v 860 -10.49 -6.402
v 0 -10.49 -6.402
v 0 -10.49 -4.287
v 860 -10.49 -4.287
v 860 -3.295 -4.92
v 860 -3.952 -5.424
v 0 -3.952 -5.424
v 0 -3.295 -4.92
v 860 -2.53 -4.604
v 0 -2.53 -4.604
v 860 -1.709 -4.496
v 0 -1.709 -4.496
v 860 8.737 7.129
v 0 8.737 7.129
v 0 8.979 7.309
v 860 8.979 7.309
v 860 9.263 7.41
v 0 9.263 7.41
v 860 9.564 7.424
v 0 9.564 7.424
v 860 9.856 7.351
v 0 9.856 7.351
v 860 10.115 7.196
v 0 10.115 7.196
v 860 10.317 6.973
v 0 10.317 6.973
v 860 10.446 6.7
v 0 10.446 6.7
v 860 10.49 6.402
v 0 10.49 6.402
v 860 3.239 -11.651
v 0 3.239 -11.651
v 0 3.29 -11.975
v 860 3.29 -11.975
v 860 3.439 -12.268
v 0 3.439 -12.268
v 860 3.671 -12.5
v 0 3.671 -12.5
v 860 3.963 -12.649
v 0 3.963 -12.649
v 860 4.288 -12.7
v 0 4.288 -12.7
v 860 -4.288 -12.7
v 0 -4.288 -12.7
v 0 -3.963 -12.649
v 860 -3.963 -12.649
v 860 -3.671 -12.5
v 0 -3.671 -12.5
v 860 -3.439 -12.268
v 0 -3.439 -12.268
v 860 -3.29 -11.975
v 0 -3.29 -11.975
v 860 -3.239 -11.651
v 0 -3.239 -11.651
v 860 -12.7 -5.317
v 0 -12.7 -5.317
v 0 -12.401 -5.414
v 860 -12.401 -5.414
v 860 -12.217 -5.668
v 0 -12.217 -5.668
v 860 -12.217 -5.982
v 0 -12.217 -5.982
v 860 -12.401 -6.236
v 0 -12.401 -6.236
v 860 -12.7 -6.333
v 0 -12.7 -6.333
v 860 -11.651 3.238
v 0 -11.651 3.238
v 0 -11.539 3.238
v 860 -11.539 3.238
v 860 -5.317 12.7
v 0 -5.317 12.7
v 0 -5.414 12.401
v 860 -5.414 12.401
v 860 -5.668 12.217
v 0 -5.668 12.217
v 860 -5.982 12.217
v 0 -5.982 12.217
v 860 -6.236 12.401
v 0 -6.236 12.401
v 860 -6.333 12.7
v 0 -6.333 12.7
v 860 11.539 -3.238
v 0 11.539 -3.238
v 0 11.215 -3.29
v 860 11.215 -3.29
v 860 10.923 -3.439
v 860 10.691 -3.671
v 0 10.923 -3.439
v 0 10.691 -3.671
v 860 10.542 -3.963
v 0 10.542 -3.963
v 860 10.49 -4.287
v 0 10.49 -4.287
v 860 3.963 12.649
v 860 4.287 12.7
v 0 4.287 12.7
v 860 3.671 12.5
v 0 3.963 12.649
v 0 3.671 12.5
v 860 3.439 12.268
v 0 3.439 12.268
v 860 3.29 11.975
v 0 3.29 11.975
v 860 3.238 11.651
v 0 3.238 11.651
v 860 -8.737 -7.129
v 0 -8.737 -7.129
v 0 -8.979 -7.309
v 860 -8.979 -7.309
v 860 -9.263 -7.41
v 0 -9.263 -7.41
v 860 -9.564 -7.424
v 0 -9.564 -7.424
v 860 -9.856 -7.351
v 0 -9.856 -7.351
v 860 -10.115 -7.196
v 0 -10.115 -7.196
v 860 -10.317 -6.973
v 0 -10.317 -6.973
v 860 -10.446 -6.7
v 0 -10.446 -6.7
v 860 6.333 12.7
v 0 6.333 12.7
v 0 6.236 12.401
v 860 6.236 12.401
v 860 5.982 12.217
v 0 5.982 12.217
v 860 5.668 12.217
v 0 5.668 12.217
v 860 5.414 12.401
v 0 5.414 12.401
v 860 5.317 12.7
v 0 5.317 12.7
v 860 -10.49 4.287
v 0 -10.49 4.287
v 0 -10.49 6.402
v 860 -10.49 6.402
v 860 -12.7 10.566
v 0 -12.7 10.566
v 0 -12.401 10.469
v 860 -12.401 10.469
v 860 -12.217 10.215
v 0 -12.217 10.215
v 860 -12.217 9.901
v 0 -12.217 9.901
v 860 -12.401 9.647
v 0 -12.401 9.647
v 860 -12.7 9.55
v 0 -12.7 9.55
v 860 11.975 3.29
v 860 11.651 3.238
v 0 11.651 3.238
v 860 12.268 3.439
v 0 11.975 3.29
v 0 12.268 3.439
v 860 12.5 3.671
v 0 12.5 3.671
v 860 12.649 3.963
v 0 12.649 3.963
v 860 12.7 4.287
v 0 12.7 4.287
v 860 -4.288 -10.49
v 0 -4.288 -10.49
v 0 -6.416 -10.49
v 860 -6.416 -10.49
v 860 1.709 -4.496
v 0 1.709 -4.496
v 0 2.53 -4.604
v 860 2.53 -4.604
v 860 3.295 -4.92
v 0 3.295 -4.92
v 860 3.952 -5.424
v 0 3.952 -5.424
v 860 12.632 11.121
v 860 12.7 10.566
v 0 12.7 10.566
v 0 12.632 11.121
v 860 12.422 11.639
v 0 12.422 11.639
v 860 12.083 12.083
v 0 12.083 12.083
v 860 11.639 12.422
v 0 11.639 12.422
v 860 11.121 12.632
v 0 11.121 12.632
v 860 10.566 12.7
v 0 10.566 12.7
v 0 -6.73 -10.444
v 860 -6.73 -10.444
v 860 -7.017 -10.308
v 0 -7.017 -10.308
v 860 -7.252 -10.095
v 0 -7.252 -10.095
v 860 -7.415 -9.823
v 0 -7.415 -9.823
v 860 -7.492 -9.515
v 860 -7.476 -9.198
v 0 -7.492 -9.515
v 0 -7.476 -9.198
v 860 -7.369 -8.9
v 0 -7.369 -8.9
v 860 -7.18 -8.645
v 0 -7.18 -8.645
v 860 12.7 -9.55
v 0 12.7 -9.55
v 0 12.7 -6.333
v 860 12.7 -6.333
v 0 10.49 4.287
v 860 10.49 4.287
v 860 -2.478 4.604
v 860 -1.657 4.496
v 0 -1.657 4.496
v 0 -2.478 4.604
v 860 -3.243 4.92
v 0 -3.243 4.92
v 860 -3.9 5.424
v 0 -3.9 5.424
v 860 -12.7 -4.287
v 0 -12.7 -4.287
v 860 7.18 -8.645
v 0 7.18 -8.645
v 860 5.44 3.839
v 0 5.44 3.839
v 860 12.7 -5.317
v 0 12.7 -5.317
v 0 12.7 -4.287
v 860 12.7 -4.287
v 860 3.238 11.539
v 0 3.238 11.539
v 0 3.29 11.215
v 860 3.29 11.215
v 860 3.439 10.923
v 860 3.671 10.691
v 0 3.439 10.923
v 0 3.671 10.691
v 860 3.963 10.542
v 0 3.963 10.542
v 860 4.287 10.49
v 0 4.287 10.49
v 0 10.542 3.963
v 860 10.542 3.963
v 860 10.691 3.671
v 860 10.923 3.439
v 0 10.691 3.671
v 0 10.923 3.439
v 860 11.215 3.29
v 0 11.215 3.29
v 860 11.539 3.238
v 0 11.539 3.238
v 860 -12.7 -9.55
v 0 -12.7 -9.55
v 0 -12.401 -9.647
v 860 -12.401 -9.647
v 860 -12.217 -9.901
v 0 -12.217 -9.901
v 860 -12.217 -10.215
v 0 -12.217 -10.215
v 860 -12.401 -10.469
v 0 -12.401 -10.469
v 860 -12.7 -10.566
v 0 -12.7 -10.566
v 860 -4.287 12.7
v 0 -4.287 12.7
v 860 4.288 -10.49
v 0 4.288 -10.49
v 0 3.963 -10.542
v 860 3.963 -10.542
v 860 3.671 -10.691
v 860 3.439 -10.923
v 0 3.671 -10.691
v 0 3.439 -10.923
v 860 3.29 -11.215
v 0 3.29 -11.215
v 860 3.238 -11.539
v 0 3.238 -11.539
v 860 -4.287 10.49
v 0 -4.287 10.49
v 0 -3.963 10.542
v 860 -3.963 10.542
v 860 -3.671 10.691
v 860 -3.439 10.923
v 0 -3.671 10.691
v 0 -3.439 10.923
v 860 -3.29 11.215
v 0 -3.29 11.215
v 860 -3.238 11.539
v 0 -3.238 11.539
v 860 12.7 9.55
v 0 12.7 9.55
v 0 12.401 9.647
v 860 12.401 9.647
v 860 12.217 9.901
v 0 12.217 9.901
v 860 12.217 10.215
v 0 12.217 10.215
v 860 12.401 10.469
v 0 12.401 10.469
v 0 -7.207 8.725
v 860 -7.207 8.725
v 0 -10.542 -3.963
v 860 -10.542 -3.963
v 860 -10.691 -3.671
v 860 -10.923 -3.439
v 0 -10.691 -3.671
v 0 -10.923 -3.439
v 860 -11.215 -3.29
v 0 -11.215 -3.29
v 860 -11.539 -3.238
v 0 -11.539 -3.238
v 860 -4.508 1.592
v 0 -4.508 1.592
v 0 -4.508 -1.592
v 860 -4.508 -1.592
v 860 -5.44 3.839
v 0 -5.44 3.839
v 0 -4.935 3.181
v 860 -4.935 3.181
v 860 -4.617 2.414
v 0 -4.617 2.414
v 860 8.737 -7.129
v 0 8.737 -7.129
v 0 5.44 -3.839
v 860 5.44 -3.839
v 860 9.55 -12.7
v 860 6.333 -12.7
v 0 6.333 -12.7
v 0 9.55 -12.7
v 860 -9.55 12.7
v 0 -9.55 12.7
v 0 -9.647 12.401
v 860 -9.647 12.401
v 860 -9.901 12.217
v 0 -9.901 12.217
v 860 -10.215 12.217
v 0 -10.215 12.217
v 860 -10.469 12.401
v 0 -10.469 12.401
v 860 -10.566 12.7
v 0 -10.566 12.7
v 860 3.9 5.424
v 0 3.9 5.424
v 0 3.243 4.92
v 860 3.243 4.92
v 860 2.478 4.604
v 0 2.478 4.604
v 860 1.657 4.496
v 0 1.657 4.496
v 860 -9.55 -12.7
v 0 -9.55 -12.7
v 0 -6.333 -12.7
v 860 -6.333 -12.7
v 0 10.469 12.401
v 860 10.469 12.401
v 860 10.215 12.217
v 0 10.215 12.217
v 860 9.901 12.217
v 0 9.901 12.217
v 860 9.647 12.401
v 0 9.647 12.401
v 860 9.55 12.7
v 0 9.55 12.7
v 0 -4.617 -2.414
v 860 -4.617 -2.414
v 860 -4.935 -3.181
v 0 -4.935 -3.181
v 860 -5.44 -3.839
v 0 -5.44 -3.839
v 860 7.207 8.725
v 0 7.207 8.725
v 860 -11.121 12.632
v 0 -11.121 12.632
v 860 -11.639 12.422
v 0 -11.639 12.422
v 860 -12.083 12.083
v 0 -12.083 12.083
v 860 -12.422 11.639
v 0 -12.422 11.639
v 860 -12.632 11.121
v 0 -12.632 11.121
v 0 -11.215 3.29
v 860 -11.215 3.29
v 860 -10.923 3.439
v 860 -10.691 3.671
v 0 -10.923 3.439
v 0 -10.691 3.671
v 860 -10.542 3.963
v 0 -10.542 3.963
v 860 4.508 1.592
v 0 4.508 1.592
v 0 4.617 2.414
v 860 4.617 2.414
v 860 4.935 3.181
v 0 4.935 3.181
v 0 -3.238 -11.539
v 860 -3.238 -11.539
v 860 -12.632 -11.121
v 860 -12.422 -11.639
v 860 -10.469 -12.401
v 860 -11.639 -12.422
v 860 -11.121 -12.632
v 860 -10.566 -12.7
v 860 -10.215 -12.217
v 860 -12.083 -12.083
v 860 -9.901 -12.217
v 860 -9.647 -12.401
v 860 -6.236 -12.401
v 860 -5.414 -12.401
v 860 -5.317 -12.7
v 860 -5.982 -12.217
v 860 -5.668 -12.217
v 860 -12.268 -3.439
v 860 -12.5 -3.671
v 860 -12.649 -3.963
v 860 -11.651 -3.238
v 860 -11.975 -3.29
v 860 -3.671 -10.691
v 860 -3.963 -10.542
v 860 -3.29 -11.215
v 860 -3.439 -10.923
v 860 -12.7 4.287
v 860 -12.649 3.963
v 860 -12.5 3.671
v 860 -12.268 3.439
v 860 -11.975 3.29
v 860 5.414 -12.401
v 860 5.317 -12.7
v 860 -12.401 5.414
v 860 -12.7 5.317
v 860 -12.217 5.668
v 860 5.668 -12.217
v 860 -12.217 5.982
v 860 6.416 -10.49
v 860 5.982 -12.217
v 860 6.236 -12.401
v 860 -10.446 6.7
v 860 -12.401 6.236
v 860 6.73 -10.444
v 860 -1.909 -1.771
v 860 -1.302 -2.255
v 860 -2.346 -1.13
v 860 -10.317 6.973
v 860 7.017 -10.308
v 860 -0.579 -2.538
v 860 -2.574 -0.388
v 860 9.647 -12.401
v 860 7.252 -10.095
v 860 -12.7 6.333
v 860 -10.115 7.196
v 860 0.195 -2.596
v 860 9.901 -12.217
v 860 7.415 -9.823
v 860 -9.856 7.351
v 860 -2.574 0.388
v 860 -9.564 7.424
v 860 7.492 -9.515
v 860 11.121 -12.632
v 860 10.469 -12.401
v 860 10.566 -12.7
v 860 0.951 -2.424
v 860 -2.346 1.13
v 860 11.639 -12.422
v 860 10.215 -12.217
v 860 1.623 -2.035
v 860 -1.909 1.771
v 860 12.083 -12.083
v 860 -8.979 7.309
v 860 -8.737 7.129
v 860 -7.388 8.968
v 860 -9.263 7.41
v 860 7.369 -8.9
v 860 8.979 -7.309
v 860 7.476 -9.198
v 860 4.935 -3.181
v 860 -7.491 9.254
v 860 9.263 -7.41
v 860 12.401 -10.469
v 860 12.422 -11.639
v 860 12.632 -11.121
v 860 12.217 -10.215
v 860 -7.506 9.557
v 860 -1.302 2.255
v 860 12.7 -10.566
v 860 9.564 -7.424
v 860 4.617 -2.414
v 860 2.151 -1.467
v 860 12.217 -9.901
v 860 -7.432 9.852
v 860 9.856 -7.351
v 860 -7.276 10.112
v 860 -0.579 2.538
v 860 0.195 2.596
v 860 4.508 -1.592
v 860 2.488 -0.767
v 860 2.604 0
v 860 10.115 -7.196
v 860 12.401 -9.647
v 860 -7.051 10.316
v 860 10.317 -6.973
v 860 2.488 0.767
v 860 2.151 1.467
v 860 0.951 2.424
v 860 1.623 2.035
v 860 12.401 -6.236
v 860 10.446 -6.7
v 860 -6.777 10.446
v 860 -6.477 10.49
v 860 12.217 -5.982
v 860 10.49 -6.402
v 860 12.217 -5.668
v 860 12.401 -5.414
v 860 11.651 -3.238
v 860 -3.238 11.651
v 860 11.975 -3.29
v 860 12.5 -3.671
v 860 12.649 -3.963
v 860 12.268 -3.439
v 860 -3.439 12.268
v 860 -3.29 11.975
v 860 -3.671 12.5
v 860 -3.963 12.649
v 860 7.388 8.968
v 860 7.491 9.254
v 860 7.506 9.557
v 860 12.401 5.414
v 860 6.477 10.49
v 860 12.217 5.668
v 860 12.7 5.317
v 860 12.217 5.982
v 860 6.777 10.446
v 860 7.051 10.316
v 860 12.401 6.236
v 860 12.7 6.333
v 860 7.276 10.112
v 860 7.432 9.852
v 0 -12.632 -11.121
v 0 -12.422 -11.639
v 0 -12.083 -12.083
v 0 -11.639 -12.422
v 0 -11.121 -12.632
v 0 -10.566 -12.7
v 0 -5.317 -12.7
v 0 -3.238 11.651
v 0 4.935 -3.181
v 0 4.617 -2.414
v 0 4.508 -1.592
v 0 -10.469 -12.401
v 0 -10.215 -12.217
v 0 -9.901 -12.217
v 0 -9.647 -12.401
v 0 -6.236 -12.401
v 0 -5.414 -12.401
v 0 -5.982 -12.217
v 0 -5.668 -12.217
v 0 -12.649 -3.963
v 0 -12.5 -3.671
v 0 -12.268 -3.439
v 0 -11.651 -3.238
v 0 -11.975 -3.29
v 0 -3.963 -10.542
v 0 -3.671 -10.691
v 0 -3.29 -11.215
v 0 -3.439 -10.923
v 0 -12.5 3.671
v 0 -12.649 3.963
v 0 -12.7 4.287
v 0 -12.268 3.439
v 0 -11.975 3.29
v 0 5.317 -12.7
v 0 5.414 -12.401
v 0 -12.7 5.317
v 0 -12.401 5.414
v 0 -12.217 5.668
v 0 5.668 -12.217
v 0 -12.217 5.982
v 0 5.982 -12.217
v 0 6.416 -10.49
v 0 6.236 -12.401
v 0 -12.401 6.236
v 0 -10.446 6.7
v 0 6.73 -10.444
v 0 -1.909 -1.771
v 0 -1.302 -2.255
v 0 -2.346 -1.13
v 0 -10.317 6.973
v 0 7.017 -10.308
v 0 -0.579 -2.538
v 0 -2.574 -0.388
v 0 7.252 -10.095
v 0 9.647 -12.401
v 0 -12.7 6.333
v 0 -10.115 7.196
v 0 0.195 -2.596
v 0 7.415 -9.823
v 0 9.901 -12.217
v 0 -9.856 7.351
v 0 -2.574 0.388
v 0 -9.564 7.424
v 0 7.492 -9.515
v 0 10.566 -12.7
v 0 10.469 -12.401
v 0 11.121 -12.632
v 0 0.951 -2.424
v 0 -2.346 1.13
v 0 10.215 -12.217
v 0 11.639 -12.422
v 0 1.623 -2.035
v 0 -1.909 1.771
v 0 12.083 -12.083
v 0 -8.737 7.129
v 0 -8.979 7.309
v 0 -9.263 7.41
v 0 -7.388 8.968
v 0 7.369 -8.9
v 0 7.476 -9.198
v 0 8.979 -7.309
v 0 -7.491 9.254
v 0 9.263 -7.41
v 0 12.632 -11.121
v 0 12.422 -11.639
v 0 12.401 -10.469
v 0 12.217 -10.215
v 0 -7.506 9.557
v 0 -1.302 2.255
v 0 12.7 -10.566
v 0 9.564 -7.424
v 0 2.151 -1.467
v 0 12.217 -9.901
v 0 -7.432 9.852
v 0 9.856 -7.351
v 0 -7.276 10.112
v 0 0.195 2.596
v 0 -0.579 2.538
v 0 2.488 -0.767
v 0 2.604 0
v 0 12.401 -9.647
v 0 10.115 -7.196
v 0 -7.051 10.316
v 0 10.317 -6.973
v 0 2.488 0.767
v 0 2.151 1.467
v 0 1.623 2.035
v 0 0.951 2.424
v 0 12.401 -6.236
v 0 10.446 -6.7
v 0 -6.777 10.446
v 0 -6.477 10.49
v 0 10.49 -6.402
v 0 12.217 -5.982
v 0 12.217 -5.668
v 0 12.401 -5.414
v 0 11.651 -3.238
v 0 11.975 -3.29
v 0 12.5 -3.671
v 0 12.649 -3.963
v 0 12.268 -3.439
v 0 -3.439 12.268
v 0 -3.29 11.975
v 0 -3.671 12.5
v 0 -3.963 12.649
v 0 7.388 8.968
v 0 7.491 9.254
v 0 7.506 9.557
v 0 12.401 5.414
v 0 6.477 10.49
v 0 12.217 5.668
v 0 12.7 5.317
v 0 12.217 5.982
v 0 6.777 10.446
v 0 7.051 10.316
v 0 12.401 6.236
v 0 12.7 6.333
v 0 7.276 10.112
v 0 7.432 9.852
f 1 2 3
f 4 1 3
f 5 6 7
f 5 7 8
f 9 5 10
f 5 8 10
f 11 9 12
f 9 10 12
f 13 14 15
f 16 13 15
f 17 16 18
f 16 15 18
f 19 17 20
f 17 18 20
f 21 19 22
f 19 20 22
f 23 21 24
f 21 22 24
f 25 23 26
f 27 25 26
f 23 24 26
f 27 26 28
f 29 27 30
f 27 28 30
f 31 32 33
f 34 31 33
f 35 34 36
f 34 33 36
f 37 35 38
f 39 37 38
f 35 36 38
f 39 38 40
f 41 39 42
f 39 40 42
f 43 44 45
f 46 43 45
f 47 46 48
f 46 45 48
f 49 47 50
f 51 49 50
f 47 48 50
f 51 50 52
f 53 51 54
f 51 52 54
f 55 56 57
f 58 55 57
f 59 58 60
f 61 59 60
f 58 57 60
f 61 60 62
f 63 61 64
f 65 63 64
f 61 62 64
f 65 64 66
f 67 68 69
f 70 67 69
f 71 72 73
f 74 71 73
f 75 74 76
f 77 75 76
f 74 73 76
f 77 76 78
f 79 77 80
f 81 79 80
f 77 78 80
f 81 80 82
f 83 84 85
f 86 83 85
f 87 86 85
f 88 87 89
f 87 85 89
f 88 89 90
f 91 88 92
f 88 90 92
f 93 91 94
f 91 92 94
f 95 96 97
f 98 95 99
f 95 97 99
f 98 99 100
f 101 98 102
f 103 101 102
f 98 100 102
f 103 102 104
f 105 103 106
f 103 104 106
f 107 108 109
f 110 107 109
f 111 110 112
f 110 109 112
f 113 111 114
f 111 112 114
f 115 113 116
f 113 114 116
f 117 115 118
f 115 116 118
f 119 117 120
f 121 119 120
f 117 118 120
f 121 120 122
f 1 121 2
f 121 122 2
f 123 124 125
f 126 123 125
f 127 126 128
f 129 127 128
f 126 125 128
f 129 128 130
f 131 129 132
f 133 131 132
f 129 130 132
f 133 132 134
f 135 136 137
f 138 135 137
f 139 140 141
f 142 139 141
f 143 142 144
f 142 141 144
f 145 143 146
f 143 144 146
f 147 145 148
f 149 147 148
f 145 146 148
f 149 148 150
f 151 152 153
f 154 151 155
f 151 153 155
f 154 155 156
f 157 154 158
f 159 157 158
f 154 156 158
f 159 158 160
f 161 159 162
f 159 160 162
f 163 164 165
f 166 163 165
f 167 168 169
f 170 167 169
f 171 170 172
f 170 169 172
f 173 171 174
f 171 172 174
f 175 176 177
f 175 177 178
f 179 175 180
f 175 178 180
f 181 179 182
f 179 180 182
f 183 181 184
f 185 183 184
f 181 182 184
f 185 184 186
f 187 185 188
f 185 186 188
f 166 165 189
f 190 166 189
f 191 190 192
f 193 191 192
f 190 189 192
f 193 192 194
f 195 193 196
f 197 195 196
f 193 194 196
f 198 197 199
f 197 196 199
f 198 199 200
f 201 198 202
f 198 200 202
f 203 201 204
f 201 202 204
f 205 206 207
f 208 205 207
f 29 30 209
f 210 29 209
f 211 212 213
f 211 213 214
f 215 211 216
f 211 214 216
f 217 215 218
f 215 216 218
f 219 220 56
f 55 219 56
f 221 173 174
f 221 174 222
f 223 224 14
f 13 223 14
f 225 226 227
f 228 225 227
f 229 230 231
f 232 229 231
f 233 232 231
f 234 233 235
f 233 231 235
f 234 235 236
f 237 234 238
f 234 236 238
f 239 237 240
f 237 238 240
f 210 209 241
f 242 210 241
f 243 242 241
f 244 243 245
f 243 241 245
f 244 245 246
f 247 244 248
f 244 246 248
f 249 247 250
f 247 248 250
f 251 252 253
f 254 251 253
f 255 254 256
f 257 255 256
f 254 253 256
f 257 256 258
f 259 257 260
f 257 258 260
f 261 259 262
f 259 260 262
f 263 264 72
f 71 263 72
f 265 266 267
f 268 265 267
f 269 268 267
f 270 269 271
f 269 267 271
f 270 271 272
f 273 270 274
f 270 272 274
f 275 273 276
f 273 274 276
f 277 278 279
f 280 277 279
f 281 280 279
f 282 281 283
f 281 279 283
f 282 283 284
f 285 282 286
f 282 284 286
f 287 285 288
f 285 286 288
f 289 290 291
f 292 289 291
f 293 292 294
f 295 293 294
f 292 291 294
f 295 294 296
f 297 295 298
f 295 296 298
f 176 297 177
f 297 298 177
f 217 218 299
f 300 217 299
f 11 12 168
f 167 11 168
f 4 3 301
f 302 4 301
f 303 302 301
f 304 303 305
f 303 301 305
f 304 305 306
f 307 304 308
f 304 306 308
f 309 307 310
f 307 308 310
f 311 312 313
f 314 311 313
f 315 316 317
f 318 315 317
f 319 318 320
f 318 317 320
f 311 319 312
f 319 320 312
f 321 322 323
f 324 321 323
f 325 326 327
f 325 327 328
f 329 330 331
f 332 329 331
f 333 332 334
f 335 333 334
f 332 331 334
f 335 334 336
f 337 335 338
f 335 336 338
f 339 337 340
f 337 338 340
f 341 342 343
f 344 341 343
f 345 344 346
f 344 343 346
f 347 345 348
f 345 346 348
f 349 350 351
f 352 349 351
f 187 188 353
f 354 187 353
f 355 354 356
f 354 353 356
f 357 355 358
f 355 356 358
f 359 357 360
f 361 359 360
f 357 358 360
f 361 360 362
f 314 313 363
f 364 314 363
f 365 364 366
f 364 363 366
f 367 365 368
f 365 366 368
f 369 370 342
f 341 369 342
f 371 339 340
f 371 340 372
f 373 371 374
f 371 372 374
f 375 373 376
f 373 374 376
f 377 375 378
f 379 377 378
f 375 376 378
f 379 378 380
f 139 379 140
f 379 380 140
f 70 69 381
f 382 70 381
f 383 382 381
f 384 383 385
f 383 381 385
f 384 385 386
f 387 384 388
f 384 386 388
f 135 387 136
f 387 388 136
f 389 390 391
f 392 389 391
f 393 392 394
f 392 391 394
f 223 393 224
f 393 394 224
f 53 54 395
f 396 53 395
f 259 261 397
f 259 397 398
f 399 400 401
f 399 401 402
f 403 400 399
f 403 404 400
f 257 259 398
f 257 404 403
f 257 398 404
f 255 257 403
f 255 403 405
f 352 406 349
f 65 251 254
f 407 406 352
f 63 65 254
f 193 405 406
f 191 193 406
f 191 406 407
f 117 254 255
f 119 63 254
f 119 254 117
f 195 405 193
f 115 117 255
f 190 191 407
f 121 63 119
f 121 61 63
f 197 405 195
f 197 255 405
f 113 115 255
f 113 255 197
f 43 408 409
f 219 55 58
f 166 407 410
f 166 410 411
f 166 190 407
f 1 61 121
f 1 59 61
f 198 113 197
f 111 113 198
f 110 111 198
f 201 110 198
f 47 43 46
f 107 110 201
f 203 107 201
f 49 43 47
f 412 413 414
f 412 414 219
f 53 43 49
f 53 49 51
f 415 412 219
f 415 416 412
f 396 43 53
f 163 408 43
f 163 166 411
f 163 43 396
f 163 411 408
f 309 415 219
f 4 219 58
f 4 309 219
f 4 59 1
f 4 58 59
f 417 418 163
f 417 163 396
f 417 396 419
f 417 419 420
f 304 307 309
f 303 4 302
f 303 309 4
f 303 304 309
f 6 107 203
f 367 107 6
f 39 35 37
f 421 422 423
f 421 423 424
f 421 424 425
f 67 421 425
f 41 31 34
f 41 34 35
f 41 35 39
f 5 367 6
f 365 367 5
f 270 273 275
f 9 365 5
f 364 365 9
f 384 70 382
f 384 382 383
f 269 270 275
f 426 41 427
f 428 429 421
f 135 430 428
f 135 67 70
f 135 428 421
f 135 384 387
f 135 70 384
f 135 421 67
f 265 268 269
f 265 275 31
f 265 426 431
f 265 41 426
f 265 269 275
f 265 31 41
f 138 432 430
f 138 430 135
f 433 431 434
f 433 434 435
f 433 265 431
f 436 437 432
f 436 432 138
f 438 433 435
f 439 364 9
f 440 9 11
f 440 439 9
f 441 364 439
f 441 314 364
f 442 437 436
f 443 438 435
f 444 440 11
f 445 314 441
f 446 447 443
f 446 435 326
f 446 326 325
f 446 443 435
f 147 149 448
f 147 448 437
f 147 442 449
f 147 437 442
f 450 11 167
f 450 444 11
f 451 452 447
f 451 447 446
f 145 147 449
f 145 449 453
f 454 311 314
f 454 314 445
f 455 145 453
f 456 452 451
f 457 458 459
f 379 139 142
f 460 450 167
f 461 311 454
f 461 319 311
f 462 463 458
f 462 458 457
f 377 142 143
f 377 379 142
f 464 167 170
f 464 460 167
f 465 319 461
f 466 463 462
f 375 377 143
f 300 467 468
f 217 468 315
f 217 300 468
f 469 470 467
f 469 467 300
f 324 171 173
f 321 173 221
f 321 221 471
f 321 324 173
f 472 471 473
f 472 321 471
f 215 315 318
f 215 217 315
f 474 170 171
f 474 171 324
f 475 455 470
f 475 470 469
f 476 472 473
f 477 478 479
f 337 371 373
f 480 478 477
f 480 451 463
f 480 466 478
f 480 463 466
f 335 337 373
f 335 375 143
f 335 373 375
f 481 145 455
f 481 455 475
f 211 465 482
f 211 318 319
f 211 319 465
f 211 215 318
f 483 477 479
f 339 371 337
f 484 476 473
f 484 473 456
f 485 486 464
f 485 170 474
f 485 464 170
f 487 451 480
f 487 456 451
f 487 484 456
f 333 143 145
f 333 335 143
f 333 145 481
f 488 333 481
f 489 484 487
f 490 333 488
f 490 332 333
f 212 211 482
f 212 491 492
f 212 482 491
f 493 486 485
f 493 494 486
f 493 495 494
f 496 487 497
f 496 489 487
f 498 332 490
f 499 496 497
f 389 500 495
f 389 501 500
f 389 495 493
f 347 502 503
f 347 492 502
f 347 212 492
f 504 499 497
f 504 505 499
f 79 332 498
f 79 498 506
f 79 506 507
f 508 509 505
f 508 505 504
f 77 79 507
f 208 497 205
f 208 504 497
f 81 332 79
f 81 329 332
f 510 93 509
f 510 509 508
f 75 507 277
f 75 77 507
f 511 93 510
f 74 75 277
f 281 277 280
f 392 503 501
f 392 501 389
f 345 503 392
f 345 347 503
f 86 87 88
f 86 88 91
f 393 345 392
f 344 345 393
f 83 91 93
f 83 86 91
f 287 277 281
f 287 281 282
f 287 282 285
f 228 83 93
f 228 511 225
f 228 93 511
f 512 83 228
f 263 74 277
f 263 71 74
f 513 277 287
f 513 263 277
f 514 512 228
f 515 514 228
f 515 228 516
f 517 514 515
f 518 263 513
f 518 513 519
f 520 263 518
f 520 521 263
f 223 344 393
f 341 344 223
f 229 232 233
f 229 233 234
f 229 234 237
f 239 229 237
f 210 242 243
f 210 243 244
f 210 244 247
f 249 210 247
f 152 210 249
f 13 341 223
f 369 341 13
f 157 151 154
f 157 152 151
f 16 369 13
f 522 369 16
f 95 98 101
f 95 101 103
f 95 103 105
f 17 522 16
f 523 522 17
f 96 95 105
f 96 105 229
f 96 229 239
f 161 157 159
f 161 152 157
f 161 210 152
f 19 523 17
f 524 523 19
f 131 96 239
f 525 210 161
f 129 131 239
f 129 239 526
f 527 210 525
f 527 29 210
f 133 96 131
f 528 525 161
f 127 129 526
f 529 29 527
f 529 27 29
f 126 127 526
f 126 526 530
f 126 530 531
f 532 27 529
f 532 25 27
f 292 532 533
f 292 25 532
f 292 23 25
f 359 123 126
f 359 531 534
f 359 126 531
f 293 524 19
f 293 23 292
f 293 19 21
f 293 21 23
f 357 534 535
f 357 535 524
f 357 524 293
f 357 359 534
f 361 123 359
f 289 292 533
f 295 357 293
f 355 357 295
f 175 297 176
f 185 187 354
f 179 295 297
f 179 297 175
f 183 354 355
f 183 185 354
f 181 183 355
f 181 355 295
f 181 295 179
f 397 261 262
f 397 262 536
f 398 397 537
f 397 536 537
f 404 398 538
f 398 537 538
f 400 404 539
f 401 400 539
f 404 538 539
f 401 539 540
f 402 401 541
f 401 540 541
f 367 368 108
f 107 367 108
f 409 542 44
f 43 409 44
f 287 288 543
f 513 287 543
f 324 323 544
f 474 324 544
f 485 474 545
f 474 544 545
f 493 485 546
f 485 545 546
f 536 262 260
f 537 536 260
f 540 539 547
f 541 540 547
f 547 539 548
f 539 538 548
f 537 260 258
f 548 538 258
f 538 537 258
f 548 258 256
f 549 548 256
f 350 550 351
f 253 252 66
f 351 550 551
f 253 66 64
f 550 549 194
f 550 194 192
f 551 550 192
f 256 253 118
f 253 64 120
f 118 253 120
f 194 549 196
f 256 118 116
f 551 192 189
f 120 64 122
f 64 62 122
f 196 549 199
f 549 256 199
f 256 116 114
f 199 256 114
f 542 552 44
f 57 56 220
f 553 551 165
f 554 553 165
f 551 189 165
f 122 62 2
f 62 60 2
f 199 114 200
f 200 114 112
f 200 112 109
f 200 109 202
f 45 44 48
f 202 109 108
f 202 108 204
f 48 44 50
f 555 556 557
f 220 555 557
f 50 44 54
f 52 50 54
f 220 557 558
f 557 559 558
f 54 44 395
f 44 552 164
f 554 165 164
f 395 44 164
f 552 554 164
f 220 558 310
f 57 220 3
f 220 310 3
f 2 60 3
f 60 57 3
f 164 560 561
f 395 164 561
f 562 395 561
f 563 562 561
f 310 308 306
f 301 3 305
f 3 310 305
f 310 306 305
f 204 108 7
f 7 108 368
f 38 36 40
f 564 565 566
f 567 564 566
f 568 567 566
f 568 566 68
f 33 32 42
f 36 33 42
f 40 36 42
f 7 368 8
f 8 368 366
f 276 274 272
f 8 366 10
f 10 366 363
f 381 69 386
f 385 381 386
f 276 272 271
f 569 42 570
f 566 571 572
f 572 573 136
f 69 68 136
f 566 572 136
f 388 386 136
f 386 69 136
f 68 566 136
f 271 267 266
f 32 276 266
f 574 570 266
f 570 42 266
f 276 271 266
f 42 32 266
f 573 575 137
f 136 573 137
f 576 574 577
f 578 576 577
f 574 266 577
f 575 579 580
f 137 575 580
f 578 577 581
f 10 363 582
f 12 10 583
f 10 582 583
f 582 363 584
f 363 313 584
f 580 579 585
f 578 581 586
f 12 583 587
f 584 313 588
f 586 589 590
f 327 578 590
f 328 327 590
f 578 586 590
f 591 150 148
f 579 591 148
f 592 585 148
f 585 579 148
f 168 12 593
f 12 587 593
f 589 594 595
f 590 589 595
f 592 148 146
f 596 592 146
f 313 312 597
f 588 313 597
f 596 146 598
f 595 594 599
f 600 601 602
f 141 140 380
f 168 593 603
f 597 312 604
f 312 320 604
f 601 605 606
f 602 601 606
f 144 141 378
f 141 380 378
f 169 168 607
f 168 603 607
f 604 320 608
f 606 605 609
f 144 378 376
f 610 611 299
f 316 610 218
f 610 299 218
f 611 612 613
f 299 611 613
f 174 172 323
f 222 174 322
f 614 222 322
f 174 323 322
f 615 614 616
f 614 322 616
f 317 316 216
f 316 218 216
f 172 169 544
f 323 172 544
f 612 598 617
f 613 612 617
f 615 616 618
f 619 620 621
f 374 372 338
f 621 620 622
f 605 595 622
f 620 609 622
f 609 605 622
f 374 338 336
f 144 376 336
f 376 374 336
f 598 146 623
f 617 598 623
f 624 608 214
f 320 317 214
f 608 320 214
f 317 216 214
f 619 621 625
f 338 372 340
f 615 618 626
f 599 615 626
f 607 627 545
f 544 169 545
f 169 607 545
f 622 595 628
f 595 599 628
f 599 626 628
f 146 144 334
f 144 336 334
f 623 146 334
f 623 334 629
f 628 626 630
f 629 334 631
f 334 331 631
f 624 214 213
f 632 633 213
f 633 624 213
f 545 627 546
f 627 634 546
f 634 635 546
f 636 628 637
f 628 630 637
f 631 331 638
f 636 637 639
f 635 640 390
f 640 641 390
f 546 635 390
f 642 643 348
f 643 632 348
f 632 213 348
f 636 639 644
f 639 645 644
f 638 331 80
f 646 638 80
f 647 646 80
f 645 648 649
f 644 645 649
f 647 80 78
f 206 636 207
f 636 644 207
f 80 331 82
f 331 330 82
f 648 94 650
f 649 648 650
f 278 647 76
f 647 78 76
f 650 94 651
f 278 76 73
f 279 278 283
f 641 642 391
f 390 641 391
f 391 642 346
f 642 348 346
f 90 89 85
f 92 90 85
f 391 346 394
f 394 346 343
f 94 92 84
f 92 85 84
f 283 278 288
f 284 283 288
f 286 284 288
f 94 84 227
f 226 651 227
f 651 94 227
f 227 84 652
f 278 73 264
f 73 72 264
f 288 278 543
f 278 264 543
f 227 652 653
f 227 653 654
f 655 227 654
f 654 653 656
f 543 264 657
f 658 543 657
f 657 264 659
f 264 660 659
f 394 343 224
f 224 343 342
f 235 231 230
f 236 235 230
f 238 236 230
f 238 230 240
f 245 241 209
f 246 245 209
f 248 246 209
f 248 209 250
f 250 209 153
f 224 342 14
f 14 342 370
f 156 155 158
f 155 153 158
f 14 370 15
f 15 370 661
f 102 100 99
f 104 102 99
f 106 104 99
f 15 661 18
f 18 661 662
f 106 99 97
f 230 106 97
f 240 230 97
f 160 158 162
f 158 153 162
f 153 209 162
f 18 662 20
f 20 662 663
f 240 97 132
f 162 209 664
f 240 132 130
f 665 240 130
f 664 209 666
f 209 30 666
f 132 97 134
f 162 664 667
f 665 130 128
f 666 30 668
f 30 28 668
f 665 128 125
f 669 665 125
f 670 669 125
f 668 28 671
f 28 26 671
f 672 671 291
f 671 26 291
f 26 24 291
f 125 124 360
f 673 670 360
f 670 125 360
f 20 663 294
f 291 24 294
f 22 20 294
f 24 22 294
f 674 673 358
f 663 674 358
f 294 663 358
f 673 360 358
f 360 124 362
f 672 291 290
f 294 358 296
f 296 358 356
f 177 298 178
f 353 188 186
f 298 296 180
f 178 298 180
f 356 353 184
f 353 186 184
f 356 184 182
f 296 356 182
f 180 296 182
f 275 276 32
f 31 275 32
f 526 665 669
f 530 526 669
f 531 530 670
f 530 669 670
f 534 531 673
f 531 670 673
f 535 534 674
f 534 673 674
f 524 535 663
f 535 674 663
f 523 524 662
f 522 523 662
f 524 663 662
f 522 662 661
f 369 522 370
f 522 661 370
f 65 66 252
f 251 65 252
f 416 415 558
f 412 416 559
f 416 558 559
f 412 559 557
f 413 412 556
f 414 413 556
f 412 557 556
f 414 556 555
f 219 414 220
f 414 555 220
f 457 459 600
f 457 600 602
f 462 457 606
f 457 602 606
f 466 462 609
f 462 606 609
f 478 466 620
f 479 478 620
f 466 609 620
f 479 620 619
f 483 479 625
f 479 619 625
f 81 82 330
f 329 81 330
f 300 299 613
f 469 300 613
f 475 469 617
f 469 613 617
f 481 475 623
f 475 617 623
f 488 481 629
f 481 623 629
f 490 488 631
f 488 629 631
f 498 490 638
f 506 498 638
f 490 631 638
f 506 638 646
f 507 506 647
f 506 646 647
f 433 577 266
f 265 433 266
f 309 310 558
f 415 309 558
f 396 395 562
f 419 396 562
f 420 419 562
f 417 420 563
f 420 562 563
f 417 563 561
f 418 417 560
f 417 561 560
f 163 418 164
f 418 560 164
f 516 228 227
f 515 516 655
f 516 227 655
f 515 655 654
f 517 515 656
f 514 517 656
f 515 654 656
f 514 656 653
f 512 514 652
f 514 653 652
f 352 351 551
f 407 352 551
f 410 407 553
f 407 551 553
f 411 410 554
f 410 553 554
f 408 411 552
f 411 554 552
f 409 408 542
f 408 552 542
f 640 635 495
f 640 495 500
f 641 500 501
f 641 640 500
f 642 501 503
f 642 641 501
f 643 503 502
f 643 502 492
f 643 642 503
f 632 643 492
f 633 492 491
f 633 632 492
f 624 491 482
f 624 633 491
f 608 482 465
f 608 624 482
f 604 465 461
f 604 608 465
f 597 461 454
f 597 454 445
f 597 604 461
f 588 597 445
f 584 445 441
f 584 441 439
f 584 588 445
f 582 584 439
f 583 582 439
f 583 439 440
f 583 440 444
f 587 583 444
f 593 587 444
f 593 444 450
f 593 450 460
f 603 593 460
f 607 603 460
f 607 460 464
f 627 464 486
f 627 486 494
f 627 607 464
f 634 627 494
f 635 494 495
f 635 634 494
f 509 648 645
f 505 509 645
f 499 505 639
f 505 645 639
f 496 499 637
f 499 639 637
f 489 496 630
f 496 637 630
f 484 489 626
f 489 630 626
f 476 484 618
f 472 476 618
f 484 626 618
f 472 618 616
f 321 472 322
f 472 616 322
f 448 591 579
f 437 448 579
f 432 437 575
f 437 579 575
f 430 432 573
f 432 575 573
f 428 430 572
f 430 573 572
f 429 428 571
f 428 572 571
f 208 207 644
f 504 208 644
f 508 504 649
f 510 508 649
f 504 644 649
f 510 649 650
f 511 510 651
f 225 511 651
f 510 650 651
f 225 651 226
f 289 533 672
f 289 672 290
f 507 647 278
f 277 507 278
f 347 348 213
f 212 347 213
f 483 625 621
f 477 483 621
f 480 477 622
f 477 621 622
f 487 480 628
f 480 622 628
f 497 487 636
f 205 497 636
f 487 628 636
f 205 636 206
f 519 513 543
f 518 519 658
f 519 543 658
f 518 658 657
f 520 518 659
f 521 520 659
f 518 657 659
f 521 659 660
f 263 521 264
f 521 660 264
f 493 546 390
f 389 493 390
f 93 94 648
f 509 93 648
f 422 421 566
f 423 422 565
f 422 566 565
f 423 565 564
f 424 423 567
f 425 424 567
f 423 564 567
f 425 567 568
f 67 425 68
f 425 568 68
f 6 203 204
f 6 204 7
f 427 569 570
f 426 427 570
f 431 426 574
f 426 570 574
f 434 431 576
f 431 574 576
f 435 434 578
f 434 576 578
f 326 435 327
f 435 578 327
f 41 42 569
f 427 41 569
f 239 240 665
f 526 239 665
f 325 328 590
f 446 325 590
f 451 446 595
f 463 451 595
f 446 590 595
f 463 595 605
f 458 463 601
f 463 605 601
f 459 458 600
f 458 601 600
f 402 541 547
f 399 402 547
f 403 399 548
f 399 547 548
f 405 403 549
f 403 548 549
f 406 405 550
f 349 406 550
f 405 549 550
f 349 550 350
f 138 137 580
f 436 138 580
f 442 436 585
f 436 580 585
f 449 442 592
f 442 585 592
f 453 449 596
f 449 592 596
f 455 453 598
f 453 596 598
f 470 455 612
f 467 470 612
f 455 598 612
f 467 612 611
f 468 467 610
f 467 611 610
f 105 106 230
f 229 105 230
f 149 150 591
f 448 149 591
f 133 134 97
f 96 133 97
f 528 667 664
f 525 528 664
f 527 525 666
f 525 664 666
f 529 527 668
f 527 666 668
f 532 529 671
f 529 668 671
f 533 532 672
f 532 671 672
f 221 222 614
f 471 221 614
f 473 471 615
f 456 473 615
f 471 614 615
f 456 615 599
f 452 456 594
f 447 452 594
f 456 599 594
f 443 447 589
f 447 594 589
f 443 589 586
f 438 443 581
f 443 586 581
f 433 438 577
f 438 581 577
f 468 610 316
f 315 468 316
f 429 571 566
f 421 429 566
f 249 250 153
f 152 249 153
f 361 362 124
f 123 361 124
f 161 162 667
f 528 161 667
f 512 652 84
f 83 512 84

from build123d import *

# Parameters (mm, degrees)
SKETCH16_R                     = 2.6035
EXTRUSION_1010_PROFILE_1_DEPTH = 860


with BuildPart() as part:
    # Sketch16 → Extrusion 1010 PROFILE(1) (new body)
    with BuildSketch(Plane.YZ):
        with BuildLine():
            Line((-1.709253557, -4.4958), (1.709253557, -4.4958))
            ThreePointArc((1.709253557, -4.4958), (2.922935876, -4.736928798), (3.95226937, -5.423689619))
            Line((3.95226937, -5.423689619), (7.179652728, -8.645192207))
            ThreePointArc((7.179652728, -8.645192207), (7.414733441, -9.822812921), (6.41641086, -10.4902))
            Line((6.41641086, -10.4902), (4.28752, -10.4902))
            ThreePointArc((4.28752, -10.4902), (3.545750844, -10.797450844), (3.2385, -11.53922))
            Line((3.2385, -11.53922), (3.2385, -11.65098))
            ThreePointArc((3.2385, -11.65098), (3.545750844, -12.392749156), (4.28752, -12.7))
            Line((4.28752, -12.7), (5.3171344, -12.7))
            ThreePointArc((5.3171344, -12.7), (5.8251344, -12.192), (6.3331344, -12.7))
            Line((6.3331344, -12.7), (9.5504, -12.7))
            ThreePointArc((9.5504, -12.7), (10.058323491, -12.192000006), (10.566399977, -12.699846982))
            ThreePointArc((10.566399977, -12.699846982), (12.082522516, -12.082522516), (12.699846982, -10.566399977))
            ThreePointArc((12.699846982, -10.566399977), (12.192000006, -10.058323491), (12.7, -9.5504))
            Line((12.7, -9.5504), (12.7, -6.3330836))
            ThreePointArc((12.7, -6.3330836), (12.192, -5.8250836), (12.7, -5.3170836))
            Line((12.7, -5.3170836), (12.7, -4.287470133))
            ThreePointArc((12.7, -4.287470133), (12.392749156, -3.545700977), (11.65098, -3.238450133))
            Line((11.65098, -3.238450133), (11.53922, -3.238450133))
            ThreePointArc((11.53922, -3.238450133), (10.797450844, -3.545700977), (10.4902, -4.287470133))
            Line((10.4902, -4.287470133), (10.4902, -6.402089023))
            ThreePointArc((10.4902, -6.402089023), (9.856394933, -7.351113629), (8.736962546, -7.129240479))
            Line((8.736962546, -7.129240479), (5.440484187, -3.838768792))
            ThreePointArc((5.440484187, -3.838768792), (4.75073678, -2.808015636), (4.5085, -1.591658411))
            Line((4.5085, -1.591658411), (4.5085, 1.591658411))
            ThreePointArc((4.5085, 1.591658411), (4.75073678, 2.808015636), (5.440484187, 3.838768792))
            Line((5.440484187, 3.838768792), (8.736962546, 7.129240479))
            ThreePointArc((8.736962546, 7.129240479), (9.856394933, 7.351113629), (10.4902, 6.402089023))
            Line((10.4902, 6.402089023), (10.4902, 4.287470133))
            ThreePointArc((10.4902, 4.287470133), (10.797450844, 3.545700977), (11.53922, 3.238450133))
            Line((11.53922, 3.238450133), (11.65098, 3.238450133))
            ThreePointArc((11.65098, 3.238450133), (12.392749156, 3.545700977), (12.7, 4.287470133))
            Line((12.7, 4.287470133), (12.7, 5.3171344))
            ThreePointArc((12.7, 5.3171344), (12.192, 5.8251344), (12.7, 6.3331344))
            Line((12.7, 6.3331344), (12.7, 9.5504))
            ThreePointArc((12.7, 9.5504), (12.192000006, 10.058323491), (12.699846982, 10.566399977))
            ThreePointArc((12.699846982, 10.566399977), (12.082522516, 12.082522516), (10.566399977, 12.699846982))
            ThreePointArc((10.566399977, 12.699846982), (10.058323491, 12.192000006), (9.5504, 12.7))
            Line((9.5504, 12.7), (6.3330836, 12.7))
            ThreePointArc((6.3330836, 12.7), (5.8250836, 12.192), (5.3170836, 12.7))
            Line((5.3170836, 12.7), (4.2874692, 12.7))
            ThreePointArc((4.2874692, 12.7), (3.545700044, 12.392749156), (3.2384492, 11.65098))
            Line((3.2384492, 11.65098), (3.2384492, 11.53922))
            ThreePointArc((3.2384492, 11.53922), (3.545700044, 10.797450844), (4.2874692, 10.4902))
            Line((4.2874692, 10.4902), (6.476774195, 10.4902))
            ThreePointArc((6.476774195, 10.4902), (7.43216212, 9.851515102), (7.207191475, 8.724540082))
            Line((7.207191475, 8.724540082), (3.900315394, 5.423689619))
            ThreePointArc((3.900315394, 5.423689619), (2.8709819, 4.736928798), (1.657299581, 4.4958))
            Line((1.657299581, 4.4958), (-1.657299581, 4.4958))
            ThreePointArc((-1.657299581, 4.4958), (-2.8709819, 4.736928798), (-3.900315394, 5.423689619))
            Line((-3.900315394, 5.423689619), (-7.207191475, 8.724540082))
            ThreePointArc((-7.207191475, 8.724540082), (-7.43216212, 9.851515102), (-6.476774195, 10.4902))
            Line((-6.476774195, 10.4902), (-4.2874692, 10.4902))
            ThreePointArc((-4.2874692, 10.4902), (-3.545700044, 10.797450844), (-3.2384492, 11.53922))
            Line((-3.2384492, 11.53922), (-3.2384492, 11.65098))
            ThreePointArc((-3.2384492, 11.65098), (-3.545700044, 12.392749156), (-4.2874692, 12.7))
            Line((-4.2874692, 12.7), (-5.3170836, 12.7))
            ThreePointArc((-5.3170836, 12.7), (-5.8250836, 12.192), (-6.3330836, 12.7))
            Line((-6.3330836, 12.7), (-9.5504, 12.7))
            ThreePointArc((-9.5504, 12.7), (-10.058323491, 12.192000006), (-10.566399977, 12.699846982))
            ThreePointArc((-10.566399977, 12.699846982), (-12.082522516, 12.082522516), (-12.699846982, 10.566399977))
            ThreePointArc((-12.699846982, 10.566399977), (-12.192000006, 10.058323491), (-12.7, 9.5504))
            Line((-12.7, 9.5504), (-12.7, 6.3331344))
            ThreePointArc((-12.7, 6.3331344), (-12.192, 5.8251344), (-12.7, 5.3171344))
            Line((-12.7, 5.3171344), (-12.7, 4.287470133))
            ThreePointArc((-12.7, 4.287470133), (-12.392749156, 3.545700977), (-11.65098, 3.238450133))
            Line((-11.65098, 3.238450133), (-11.53922, 3.238450133))
            ThreePointArc((-11.53922, 3.238450133), (-10.797450844, 3.545700977), (-10.4902, 4.287470133))
            Line((-10.4902, 4.287470133), (-10.4902, 6.402089023))
            ThreePointArc((-10.4902, 6.402089023), (-9.856394933, 7.351113629), (-8.736962546, 7.129240479))
            Line((-8.736962546, 7.129240479), (-5.440484187, 3.838768792))
            ThreePointArc((-5.440484187, 3.838768792), (-4.75073678, 2.808015636), (-4.5085, 1.591658411))
            Line((-4.5085, 1.591658411), (-4.5085, -1.591658411))
            ThreePointArc((-4.5085, -1.591658411), (-4.75073678, -2.808015636), (-5.440484187, -3.838768792))
            Line((-5.440484187, -3.838768792), (-8.736962546, -7.129240479))
            ThreePointArc((-8.736962546, -7.129240479), (-9.856394933, -7.351113629), (-10.4902, -6.402089023))
            Line((-10.4902, -6.402089023), (-10.4902, -4.287470133))
            ThreePointArc((-10.4902, -4.287470133), (-10.797450844, -3.545700977), (-11.53922, -3.238450133))
            Line((-11.53922, -3.238450133), (-11.65098, -3.238450133))
            ThreePointArc((-11.65098, -3.238450133), (-12.392749156, -3.545700977), (-12.7, -4.287470133))
            Line((-12.7, -4.287470133), (-12.7, -5.3170836))
            ThreePointArc((-12.7, -5.3170836), (-12.192, -5.8250836), (-12.7, -6.3330836))
            Line((-12.7, -6.3330836), (-12.7, -9.5504))
            ThreePointArc((-12.7, -9.5504), (-12.192000006, -10.058323491), (-12.699846982, -10.566399977))
            ThreePointArc((-12.699846982, -10.566399977), (-12.082522516, -12.082522516), (-10.566399977, -12.699846982))
            ThreePointArc((-10.566399977, -12.699846982), (-10.058323491, -12.192000006), (-9.5504, -12.7))
            Line((-9.5504, -12.7), (-6.3331344, -12.7))
            ThreePointArc((-6.3331344, -12.7), (-5.8251344, -12.192), (-5.3171344, -12.7))
            Line((-5.3171344, -12.7), (-4.28752, -12.7))
            ThreePointArc((-4.28752, -12.7), (-3.545750844, -12.392749156), (-3.2385, -11.65098))
            Line((-3.2385, -11.65098), (-3.2385, -11.53922))
            ThreePointArc((-3.2385, -11.53922), (-3.545750844, -10.797450844), (-4.28752, -10.4902))
            Line((-4.28752, -10.4902), (-6.41641086, -10.4902))
            ThreePointArc((-6.41641086, -10.4902), (-7.414733441, -9.822812921), (-7.179652728, -8.645192207))
            Line((-7.179652728, -8.645192207), (-3.95226937, -5.423689619))
            ThreePointArc((-3.95226937, -5.423689619), (-2.922935876, -4.736928798), (-1.709253557, -4.4958))
        make_face()
        Circle(SKETCH16_R, mode=Mode.SUBTRACT)
    extrude(amount=EXTRUSION_1010_PROFILE_1_DEPTH)


solid = part.part
